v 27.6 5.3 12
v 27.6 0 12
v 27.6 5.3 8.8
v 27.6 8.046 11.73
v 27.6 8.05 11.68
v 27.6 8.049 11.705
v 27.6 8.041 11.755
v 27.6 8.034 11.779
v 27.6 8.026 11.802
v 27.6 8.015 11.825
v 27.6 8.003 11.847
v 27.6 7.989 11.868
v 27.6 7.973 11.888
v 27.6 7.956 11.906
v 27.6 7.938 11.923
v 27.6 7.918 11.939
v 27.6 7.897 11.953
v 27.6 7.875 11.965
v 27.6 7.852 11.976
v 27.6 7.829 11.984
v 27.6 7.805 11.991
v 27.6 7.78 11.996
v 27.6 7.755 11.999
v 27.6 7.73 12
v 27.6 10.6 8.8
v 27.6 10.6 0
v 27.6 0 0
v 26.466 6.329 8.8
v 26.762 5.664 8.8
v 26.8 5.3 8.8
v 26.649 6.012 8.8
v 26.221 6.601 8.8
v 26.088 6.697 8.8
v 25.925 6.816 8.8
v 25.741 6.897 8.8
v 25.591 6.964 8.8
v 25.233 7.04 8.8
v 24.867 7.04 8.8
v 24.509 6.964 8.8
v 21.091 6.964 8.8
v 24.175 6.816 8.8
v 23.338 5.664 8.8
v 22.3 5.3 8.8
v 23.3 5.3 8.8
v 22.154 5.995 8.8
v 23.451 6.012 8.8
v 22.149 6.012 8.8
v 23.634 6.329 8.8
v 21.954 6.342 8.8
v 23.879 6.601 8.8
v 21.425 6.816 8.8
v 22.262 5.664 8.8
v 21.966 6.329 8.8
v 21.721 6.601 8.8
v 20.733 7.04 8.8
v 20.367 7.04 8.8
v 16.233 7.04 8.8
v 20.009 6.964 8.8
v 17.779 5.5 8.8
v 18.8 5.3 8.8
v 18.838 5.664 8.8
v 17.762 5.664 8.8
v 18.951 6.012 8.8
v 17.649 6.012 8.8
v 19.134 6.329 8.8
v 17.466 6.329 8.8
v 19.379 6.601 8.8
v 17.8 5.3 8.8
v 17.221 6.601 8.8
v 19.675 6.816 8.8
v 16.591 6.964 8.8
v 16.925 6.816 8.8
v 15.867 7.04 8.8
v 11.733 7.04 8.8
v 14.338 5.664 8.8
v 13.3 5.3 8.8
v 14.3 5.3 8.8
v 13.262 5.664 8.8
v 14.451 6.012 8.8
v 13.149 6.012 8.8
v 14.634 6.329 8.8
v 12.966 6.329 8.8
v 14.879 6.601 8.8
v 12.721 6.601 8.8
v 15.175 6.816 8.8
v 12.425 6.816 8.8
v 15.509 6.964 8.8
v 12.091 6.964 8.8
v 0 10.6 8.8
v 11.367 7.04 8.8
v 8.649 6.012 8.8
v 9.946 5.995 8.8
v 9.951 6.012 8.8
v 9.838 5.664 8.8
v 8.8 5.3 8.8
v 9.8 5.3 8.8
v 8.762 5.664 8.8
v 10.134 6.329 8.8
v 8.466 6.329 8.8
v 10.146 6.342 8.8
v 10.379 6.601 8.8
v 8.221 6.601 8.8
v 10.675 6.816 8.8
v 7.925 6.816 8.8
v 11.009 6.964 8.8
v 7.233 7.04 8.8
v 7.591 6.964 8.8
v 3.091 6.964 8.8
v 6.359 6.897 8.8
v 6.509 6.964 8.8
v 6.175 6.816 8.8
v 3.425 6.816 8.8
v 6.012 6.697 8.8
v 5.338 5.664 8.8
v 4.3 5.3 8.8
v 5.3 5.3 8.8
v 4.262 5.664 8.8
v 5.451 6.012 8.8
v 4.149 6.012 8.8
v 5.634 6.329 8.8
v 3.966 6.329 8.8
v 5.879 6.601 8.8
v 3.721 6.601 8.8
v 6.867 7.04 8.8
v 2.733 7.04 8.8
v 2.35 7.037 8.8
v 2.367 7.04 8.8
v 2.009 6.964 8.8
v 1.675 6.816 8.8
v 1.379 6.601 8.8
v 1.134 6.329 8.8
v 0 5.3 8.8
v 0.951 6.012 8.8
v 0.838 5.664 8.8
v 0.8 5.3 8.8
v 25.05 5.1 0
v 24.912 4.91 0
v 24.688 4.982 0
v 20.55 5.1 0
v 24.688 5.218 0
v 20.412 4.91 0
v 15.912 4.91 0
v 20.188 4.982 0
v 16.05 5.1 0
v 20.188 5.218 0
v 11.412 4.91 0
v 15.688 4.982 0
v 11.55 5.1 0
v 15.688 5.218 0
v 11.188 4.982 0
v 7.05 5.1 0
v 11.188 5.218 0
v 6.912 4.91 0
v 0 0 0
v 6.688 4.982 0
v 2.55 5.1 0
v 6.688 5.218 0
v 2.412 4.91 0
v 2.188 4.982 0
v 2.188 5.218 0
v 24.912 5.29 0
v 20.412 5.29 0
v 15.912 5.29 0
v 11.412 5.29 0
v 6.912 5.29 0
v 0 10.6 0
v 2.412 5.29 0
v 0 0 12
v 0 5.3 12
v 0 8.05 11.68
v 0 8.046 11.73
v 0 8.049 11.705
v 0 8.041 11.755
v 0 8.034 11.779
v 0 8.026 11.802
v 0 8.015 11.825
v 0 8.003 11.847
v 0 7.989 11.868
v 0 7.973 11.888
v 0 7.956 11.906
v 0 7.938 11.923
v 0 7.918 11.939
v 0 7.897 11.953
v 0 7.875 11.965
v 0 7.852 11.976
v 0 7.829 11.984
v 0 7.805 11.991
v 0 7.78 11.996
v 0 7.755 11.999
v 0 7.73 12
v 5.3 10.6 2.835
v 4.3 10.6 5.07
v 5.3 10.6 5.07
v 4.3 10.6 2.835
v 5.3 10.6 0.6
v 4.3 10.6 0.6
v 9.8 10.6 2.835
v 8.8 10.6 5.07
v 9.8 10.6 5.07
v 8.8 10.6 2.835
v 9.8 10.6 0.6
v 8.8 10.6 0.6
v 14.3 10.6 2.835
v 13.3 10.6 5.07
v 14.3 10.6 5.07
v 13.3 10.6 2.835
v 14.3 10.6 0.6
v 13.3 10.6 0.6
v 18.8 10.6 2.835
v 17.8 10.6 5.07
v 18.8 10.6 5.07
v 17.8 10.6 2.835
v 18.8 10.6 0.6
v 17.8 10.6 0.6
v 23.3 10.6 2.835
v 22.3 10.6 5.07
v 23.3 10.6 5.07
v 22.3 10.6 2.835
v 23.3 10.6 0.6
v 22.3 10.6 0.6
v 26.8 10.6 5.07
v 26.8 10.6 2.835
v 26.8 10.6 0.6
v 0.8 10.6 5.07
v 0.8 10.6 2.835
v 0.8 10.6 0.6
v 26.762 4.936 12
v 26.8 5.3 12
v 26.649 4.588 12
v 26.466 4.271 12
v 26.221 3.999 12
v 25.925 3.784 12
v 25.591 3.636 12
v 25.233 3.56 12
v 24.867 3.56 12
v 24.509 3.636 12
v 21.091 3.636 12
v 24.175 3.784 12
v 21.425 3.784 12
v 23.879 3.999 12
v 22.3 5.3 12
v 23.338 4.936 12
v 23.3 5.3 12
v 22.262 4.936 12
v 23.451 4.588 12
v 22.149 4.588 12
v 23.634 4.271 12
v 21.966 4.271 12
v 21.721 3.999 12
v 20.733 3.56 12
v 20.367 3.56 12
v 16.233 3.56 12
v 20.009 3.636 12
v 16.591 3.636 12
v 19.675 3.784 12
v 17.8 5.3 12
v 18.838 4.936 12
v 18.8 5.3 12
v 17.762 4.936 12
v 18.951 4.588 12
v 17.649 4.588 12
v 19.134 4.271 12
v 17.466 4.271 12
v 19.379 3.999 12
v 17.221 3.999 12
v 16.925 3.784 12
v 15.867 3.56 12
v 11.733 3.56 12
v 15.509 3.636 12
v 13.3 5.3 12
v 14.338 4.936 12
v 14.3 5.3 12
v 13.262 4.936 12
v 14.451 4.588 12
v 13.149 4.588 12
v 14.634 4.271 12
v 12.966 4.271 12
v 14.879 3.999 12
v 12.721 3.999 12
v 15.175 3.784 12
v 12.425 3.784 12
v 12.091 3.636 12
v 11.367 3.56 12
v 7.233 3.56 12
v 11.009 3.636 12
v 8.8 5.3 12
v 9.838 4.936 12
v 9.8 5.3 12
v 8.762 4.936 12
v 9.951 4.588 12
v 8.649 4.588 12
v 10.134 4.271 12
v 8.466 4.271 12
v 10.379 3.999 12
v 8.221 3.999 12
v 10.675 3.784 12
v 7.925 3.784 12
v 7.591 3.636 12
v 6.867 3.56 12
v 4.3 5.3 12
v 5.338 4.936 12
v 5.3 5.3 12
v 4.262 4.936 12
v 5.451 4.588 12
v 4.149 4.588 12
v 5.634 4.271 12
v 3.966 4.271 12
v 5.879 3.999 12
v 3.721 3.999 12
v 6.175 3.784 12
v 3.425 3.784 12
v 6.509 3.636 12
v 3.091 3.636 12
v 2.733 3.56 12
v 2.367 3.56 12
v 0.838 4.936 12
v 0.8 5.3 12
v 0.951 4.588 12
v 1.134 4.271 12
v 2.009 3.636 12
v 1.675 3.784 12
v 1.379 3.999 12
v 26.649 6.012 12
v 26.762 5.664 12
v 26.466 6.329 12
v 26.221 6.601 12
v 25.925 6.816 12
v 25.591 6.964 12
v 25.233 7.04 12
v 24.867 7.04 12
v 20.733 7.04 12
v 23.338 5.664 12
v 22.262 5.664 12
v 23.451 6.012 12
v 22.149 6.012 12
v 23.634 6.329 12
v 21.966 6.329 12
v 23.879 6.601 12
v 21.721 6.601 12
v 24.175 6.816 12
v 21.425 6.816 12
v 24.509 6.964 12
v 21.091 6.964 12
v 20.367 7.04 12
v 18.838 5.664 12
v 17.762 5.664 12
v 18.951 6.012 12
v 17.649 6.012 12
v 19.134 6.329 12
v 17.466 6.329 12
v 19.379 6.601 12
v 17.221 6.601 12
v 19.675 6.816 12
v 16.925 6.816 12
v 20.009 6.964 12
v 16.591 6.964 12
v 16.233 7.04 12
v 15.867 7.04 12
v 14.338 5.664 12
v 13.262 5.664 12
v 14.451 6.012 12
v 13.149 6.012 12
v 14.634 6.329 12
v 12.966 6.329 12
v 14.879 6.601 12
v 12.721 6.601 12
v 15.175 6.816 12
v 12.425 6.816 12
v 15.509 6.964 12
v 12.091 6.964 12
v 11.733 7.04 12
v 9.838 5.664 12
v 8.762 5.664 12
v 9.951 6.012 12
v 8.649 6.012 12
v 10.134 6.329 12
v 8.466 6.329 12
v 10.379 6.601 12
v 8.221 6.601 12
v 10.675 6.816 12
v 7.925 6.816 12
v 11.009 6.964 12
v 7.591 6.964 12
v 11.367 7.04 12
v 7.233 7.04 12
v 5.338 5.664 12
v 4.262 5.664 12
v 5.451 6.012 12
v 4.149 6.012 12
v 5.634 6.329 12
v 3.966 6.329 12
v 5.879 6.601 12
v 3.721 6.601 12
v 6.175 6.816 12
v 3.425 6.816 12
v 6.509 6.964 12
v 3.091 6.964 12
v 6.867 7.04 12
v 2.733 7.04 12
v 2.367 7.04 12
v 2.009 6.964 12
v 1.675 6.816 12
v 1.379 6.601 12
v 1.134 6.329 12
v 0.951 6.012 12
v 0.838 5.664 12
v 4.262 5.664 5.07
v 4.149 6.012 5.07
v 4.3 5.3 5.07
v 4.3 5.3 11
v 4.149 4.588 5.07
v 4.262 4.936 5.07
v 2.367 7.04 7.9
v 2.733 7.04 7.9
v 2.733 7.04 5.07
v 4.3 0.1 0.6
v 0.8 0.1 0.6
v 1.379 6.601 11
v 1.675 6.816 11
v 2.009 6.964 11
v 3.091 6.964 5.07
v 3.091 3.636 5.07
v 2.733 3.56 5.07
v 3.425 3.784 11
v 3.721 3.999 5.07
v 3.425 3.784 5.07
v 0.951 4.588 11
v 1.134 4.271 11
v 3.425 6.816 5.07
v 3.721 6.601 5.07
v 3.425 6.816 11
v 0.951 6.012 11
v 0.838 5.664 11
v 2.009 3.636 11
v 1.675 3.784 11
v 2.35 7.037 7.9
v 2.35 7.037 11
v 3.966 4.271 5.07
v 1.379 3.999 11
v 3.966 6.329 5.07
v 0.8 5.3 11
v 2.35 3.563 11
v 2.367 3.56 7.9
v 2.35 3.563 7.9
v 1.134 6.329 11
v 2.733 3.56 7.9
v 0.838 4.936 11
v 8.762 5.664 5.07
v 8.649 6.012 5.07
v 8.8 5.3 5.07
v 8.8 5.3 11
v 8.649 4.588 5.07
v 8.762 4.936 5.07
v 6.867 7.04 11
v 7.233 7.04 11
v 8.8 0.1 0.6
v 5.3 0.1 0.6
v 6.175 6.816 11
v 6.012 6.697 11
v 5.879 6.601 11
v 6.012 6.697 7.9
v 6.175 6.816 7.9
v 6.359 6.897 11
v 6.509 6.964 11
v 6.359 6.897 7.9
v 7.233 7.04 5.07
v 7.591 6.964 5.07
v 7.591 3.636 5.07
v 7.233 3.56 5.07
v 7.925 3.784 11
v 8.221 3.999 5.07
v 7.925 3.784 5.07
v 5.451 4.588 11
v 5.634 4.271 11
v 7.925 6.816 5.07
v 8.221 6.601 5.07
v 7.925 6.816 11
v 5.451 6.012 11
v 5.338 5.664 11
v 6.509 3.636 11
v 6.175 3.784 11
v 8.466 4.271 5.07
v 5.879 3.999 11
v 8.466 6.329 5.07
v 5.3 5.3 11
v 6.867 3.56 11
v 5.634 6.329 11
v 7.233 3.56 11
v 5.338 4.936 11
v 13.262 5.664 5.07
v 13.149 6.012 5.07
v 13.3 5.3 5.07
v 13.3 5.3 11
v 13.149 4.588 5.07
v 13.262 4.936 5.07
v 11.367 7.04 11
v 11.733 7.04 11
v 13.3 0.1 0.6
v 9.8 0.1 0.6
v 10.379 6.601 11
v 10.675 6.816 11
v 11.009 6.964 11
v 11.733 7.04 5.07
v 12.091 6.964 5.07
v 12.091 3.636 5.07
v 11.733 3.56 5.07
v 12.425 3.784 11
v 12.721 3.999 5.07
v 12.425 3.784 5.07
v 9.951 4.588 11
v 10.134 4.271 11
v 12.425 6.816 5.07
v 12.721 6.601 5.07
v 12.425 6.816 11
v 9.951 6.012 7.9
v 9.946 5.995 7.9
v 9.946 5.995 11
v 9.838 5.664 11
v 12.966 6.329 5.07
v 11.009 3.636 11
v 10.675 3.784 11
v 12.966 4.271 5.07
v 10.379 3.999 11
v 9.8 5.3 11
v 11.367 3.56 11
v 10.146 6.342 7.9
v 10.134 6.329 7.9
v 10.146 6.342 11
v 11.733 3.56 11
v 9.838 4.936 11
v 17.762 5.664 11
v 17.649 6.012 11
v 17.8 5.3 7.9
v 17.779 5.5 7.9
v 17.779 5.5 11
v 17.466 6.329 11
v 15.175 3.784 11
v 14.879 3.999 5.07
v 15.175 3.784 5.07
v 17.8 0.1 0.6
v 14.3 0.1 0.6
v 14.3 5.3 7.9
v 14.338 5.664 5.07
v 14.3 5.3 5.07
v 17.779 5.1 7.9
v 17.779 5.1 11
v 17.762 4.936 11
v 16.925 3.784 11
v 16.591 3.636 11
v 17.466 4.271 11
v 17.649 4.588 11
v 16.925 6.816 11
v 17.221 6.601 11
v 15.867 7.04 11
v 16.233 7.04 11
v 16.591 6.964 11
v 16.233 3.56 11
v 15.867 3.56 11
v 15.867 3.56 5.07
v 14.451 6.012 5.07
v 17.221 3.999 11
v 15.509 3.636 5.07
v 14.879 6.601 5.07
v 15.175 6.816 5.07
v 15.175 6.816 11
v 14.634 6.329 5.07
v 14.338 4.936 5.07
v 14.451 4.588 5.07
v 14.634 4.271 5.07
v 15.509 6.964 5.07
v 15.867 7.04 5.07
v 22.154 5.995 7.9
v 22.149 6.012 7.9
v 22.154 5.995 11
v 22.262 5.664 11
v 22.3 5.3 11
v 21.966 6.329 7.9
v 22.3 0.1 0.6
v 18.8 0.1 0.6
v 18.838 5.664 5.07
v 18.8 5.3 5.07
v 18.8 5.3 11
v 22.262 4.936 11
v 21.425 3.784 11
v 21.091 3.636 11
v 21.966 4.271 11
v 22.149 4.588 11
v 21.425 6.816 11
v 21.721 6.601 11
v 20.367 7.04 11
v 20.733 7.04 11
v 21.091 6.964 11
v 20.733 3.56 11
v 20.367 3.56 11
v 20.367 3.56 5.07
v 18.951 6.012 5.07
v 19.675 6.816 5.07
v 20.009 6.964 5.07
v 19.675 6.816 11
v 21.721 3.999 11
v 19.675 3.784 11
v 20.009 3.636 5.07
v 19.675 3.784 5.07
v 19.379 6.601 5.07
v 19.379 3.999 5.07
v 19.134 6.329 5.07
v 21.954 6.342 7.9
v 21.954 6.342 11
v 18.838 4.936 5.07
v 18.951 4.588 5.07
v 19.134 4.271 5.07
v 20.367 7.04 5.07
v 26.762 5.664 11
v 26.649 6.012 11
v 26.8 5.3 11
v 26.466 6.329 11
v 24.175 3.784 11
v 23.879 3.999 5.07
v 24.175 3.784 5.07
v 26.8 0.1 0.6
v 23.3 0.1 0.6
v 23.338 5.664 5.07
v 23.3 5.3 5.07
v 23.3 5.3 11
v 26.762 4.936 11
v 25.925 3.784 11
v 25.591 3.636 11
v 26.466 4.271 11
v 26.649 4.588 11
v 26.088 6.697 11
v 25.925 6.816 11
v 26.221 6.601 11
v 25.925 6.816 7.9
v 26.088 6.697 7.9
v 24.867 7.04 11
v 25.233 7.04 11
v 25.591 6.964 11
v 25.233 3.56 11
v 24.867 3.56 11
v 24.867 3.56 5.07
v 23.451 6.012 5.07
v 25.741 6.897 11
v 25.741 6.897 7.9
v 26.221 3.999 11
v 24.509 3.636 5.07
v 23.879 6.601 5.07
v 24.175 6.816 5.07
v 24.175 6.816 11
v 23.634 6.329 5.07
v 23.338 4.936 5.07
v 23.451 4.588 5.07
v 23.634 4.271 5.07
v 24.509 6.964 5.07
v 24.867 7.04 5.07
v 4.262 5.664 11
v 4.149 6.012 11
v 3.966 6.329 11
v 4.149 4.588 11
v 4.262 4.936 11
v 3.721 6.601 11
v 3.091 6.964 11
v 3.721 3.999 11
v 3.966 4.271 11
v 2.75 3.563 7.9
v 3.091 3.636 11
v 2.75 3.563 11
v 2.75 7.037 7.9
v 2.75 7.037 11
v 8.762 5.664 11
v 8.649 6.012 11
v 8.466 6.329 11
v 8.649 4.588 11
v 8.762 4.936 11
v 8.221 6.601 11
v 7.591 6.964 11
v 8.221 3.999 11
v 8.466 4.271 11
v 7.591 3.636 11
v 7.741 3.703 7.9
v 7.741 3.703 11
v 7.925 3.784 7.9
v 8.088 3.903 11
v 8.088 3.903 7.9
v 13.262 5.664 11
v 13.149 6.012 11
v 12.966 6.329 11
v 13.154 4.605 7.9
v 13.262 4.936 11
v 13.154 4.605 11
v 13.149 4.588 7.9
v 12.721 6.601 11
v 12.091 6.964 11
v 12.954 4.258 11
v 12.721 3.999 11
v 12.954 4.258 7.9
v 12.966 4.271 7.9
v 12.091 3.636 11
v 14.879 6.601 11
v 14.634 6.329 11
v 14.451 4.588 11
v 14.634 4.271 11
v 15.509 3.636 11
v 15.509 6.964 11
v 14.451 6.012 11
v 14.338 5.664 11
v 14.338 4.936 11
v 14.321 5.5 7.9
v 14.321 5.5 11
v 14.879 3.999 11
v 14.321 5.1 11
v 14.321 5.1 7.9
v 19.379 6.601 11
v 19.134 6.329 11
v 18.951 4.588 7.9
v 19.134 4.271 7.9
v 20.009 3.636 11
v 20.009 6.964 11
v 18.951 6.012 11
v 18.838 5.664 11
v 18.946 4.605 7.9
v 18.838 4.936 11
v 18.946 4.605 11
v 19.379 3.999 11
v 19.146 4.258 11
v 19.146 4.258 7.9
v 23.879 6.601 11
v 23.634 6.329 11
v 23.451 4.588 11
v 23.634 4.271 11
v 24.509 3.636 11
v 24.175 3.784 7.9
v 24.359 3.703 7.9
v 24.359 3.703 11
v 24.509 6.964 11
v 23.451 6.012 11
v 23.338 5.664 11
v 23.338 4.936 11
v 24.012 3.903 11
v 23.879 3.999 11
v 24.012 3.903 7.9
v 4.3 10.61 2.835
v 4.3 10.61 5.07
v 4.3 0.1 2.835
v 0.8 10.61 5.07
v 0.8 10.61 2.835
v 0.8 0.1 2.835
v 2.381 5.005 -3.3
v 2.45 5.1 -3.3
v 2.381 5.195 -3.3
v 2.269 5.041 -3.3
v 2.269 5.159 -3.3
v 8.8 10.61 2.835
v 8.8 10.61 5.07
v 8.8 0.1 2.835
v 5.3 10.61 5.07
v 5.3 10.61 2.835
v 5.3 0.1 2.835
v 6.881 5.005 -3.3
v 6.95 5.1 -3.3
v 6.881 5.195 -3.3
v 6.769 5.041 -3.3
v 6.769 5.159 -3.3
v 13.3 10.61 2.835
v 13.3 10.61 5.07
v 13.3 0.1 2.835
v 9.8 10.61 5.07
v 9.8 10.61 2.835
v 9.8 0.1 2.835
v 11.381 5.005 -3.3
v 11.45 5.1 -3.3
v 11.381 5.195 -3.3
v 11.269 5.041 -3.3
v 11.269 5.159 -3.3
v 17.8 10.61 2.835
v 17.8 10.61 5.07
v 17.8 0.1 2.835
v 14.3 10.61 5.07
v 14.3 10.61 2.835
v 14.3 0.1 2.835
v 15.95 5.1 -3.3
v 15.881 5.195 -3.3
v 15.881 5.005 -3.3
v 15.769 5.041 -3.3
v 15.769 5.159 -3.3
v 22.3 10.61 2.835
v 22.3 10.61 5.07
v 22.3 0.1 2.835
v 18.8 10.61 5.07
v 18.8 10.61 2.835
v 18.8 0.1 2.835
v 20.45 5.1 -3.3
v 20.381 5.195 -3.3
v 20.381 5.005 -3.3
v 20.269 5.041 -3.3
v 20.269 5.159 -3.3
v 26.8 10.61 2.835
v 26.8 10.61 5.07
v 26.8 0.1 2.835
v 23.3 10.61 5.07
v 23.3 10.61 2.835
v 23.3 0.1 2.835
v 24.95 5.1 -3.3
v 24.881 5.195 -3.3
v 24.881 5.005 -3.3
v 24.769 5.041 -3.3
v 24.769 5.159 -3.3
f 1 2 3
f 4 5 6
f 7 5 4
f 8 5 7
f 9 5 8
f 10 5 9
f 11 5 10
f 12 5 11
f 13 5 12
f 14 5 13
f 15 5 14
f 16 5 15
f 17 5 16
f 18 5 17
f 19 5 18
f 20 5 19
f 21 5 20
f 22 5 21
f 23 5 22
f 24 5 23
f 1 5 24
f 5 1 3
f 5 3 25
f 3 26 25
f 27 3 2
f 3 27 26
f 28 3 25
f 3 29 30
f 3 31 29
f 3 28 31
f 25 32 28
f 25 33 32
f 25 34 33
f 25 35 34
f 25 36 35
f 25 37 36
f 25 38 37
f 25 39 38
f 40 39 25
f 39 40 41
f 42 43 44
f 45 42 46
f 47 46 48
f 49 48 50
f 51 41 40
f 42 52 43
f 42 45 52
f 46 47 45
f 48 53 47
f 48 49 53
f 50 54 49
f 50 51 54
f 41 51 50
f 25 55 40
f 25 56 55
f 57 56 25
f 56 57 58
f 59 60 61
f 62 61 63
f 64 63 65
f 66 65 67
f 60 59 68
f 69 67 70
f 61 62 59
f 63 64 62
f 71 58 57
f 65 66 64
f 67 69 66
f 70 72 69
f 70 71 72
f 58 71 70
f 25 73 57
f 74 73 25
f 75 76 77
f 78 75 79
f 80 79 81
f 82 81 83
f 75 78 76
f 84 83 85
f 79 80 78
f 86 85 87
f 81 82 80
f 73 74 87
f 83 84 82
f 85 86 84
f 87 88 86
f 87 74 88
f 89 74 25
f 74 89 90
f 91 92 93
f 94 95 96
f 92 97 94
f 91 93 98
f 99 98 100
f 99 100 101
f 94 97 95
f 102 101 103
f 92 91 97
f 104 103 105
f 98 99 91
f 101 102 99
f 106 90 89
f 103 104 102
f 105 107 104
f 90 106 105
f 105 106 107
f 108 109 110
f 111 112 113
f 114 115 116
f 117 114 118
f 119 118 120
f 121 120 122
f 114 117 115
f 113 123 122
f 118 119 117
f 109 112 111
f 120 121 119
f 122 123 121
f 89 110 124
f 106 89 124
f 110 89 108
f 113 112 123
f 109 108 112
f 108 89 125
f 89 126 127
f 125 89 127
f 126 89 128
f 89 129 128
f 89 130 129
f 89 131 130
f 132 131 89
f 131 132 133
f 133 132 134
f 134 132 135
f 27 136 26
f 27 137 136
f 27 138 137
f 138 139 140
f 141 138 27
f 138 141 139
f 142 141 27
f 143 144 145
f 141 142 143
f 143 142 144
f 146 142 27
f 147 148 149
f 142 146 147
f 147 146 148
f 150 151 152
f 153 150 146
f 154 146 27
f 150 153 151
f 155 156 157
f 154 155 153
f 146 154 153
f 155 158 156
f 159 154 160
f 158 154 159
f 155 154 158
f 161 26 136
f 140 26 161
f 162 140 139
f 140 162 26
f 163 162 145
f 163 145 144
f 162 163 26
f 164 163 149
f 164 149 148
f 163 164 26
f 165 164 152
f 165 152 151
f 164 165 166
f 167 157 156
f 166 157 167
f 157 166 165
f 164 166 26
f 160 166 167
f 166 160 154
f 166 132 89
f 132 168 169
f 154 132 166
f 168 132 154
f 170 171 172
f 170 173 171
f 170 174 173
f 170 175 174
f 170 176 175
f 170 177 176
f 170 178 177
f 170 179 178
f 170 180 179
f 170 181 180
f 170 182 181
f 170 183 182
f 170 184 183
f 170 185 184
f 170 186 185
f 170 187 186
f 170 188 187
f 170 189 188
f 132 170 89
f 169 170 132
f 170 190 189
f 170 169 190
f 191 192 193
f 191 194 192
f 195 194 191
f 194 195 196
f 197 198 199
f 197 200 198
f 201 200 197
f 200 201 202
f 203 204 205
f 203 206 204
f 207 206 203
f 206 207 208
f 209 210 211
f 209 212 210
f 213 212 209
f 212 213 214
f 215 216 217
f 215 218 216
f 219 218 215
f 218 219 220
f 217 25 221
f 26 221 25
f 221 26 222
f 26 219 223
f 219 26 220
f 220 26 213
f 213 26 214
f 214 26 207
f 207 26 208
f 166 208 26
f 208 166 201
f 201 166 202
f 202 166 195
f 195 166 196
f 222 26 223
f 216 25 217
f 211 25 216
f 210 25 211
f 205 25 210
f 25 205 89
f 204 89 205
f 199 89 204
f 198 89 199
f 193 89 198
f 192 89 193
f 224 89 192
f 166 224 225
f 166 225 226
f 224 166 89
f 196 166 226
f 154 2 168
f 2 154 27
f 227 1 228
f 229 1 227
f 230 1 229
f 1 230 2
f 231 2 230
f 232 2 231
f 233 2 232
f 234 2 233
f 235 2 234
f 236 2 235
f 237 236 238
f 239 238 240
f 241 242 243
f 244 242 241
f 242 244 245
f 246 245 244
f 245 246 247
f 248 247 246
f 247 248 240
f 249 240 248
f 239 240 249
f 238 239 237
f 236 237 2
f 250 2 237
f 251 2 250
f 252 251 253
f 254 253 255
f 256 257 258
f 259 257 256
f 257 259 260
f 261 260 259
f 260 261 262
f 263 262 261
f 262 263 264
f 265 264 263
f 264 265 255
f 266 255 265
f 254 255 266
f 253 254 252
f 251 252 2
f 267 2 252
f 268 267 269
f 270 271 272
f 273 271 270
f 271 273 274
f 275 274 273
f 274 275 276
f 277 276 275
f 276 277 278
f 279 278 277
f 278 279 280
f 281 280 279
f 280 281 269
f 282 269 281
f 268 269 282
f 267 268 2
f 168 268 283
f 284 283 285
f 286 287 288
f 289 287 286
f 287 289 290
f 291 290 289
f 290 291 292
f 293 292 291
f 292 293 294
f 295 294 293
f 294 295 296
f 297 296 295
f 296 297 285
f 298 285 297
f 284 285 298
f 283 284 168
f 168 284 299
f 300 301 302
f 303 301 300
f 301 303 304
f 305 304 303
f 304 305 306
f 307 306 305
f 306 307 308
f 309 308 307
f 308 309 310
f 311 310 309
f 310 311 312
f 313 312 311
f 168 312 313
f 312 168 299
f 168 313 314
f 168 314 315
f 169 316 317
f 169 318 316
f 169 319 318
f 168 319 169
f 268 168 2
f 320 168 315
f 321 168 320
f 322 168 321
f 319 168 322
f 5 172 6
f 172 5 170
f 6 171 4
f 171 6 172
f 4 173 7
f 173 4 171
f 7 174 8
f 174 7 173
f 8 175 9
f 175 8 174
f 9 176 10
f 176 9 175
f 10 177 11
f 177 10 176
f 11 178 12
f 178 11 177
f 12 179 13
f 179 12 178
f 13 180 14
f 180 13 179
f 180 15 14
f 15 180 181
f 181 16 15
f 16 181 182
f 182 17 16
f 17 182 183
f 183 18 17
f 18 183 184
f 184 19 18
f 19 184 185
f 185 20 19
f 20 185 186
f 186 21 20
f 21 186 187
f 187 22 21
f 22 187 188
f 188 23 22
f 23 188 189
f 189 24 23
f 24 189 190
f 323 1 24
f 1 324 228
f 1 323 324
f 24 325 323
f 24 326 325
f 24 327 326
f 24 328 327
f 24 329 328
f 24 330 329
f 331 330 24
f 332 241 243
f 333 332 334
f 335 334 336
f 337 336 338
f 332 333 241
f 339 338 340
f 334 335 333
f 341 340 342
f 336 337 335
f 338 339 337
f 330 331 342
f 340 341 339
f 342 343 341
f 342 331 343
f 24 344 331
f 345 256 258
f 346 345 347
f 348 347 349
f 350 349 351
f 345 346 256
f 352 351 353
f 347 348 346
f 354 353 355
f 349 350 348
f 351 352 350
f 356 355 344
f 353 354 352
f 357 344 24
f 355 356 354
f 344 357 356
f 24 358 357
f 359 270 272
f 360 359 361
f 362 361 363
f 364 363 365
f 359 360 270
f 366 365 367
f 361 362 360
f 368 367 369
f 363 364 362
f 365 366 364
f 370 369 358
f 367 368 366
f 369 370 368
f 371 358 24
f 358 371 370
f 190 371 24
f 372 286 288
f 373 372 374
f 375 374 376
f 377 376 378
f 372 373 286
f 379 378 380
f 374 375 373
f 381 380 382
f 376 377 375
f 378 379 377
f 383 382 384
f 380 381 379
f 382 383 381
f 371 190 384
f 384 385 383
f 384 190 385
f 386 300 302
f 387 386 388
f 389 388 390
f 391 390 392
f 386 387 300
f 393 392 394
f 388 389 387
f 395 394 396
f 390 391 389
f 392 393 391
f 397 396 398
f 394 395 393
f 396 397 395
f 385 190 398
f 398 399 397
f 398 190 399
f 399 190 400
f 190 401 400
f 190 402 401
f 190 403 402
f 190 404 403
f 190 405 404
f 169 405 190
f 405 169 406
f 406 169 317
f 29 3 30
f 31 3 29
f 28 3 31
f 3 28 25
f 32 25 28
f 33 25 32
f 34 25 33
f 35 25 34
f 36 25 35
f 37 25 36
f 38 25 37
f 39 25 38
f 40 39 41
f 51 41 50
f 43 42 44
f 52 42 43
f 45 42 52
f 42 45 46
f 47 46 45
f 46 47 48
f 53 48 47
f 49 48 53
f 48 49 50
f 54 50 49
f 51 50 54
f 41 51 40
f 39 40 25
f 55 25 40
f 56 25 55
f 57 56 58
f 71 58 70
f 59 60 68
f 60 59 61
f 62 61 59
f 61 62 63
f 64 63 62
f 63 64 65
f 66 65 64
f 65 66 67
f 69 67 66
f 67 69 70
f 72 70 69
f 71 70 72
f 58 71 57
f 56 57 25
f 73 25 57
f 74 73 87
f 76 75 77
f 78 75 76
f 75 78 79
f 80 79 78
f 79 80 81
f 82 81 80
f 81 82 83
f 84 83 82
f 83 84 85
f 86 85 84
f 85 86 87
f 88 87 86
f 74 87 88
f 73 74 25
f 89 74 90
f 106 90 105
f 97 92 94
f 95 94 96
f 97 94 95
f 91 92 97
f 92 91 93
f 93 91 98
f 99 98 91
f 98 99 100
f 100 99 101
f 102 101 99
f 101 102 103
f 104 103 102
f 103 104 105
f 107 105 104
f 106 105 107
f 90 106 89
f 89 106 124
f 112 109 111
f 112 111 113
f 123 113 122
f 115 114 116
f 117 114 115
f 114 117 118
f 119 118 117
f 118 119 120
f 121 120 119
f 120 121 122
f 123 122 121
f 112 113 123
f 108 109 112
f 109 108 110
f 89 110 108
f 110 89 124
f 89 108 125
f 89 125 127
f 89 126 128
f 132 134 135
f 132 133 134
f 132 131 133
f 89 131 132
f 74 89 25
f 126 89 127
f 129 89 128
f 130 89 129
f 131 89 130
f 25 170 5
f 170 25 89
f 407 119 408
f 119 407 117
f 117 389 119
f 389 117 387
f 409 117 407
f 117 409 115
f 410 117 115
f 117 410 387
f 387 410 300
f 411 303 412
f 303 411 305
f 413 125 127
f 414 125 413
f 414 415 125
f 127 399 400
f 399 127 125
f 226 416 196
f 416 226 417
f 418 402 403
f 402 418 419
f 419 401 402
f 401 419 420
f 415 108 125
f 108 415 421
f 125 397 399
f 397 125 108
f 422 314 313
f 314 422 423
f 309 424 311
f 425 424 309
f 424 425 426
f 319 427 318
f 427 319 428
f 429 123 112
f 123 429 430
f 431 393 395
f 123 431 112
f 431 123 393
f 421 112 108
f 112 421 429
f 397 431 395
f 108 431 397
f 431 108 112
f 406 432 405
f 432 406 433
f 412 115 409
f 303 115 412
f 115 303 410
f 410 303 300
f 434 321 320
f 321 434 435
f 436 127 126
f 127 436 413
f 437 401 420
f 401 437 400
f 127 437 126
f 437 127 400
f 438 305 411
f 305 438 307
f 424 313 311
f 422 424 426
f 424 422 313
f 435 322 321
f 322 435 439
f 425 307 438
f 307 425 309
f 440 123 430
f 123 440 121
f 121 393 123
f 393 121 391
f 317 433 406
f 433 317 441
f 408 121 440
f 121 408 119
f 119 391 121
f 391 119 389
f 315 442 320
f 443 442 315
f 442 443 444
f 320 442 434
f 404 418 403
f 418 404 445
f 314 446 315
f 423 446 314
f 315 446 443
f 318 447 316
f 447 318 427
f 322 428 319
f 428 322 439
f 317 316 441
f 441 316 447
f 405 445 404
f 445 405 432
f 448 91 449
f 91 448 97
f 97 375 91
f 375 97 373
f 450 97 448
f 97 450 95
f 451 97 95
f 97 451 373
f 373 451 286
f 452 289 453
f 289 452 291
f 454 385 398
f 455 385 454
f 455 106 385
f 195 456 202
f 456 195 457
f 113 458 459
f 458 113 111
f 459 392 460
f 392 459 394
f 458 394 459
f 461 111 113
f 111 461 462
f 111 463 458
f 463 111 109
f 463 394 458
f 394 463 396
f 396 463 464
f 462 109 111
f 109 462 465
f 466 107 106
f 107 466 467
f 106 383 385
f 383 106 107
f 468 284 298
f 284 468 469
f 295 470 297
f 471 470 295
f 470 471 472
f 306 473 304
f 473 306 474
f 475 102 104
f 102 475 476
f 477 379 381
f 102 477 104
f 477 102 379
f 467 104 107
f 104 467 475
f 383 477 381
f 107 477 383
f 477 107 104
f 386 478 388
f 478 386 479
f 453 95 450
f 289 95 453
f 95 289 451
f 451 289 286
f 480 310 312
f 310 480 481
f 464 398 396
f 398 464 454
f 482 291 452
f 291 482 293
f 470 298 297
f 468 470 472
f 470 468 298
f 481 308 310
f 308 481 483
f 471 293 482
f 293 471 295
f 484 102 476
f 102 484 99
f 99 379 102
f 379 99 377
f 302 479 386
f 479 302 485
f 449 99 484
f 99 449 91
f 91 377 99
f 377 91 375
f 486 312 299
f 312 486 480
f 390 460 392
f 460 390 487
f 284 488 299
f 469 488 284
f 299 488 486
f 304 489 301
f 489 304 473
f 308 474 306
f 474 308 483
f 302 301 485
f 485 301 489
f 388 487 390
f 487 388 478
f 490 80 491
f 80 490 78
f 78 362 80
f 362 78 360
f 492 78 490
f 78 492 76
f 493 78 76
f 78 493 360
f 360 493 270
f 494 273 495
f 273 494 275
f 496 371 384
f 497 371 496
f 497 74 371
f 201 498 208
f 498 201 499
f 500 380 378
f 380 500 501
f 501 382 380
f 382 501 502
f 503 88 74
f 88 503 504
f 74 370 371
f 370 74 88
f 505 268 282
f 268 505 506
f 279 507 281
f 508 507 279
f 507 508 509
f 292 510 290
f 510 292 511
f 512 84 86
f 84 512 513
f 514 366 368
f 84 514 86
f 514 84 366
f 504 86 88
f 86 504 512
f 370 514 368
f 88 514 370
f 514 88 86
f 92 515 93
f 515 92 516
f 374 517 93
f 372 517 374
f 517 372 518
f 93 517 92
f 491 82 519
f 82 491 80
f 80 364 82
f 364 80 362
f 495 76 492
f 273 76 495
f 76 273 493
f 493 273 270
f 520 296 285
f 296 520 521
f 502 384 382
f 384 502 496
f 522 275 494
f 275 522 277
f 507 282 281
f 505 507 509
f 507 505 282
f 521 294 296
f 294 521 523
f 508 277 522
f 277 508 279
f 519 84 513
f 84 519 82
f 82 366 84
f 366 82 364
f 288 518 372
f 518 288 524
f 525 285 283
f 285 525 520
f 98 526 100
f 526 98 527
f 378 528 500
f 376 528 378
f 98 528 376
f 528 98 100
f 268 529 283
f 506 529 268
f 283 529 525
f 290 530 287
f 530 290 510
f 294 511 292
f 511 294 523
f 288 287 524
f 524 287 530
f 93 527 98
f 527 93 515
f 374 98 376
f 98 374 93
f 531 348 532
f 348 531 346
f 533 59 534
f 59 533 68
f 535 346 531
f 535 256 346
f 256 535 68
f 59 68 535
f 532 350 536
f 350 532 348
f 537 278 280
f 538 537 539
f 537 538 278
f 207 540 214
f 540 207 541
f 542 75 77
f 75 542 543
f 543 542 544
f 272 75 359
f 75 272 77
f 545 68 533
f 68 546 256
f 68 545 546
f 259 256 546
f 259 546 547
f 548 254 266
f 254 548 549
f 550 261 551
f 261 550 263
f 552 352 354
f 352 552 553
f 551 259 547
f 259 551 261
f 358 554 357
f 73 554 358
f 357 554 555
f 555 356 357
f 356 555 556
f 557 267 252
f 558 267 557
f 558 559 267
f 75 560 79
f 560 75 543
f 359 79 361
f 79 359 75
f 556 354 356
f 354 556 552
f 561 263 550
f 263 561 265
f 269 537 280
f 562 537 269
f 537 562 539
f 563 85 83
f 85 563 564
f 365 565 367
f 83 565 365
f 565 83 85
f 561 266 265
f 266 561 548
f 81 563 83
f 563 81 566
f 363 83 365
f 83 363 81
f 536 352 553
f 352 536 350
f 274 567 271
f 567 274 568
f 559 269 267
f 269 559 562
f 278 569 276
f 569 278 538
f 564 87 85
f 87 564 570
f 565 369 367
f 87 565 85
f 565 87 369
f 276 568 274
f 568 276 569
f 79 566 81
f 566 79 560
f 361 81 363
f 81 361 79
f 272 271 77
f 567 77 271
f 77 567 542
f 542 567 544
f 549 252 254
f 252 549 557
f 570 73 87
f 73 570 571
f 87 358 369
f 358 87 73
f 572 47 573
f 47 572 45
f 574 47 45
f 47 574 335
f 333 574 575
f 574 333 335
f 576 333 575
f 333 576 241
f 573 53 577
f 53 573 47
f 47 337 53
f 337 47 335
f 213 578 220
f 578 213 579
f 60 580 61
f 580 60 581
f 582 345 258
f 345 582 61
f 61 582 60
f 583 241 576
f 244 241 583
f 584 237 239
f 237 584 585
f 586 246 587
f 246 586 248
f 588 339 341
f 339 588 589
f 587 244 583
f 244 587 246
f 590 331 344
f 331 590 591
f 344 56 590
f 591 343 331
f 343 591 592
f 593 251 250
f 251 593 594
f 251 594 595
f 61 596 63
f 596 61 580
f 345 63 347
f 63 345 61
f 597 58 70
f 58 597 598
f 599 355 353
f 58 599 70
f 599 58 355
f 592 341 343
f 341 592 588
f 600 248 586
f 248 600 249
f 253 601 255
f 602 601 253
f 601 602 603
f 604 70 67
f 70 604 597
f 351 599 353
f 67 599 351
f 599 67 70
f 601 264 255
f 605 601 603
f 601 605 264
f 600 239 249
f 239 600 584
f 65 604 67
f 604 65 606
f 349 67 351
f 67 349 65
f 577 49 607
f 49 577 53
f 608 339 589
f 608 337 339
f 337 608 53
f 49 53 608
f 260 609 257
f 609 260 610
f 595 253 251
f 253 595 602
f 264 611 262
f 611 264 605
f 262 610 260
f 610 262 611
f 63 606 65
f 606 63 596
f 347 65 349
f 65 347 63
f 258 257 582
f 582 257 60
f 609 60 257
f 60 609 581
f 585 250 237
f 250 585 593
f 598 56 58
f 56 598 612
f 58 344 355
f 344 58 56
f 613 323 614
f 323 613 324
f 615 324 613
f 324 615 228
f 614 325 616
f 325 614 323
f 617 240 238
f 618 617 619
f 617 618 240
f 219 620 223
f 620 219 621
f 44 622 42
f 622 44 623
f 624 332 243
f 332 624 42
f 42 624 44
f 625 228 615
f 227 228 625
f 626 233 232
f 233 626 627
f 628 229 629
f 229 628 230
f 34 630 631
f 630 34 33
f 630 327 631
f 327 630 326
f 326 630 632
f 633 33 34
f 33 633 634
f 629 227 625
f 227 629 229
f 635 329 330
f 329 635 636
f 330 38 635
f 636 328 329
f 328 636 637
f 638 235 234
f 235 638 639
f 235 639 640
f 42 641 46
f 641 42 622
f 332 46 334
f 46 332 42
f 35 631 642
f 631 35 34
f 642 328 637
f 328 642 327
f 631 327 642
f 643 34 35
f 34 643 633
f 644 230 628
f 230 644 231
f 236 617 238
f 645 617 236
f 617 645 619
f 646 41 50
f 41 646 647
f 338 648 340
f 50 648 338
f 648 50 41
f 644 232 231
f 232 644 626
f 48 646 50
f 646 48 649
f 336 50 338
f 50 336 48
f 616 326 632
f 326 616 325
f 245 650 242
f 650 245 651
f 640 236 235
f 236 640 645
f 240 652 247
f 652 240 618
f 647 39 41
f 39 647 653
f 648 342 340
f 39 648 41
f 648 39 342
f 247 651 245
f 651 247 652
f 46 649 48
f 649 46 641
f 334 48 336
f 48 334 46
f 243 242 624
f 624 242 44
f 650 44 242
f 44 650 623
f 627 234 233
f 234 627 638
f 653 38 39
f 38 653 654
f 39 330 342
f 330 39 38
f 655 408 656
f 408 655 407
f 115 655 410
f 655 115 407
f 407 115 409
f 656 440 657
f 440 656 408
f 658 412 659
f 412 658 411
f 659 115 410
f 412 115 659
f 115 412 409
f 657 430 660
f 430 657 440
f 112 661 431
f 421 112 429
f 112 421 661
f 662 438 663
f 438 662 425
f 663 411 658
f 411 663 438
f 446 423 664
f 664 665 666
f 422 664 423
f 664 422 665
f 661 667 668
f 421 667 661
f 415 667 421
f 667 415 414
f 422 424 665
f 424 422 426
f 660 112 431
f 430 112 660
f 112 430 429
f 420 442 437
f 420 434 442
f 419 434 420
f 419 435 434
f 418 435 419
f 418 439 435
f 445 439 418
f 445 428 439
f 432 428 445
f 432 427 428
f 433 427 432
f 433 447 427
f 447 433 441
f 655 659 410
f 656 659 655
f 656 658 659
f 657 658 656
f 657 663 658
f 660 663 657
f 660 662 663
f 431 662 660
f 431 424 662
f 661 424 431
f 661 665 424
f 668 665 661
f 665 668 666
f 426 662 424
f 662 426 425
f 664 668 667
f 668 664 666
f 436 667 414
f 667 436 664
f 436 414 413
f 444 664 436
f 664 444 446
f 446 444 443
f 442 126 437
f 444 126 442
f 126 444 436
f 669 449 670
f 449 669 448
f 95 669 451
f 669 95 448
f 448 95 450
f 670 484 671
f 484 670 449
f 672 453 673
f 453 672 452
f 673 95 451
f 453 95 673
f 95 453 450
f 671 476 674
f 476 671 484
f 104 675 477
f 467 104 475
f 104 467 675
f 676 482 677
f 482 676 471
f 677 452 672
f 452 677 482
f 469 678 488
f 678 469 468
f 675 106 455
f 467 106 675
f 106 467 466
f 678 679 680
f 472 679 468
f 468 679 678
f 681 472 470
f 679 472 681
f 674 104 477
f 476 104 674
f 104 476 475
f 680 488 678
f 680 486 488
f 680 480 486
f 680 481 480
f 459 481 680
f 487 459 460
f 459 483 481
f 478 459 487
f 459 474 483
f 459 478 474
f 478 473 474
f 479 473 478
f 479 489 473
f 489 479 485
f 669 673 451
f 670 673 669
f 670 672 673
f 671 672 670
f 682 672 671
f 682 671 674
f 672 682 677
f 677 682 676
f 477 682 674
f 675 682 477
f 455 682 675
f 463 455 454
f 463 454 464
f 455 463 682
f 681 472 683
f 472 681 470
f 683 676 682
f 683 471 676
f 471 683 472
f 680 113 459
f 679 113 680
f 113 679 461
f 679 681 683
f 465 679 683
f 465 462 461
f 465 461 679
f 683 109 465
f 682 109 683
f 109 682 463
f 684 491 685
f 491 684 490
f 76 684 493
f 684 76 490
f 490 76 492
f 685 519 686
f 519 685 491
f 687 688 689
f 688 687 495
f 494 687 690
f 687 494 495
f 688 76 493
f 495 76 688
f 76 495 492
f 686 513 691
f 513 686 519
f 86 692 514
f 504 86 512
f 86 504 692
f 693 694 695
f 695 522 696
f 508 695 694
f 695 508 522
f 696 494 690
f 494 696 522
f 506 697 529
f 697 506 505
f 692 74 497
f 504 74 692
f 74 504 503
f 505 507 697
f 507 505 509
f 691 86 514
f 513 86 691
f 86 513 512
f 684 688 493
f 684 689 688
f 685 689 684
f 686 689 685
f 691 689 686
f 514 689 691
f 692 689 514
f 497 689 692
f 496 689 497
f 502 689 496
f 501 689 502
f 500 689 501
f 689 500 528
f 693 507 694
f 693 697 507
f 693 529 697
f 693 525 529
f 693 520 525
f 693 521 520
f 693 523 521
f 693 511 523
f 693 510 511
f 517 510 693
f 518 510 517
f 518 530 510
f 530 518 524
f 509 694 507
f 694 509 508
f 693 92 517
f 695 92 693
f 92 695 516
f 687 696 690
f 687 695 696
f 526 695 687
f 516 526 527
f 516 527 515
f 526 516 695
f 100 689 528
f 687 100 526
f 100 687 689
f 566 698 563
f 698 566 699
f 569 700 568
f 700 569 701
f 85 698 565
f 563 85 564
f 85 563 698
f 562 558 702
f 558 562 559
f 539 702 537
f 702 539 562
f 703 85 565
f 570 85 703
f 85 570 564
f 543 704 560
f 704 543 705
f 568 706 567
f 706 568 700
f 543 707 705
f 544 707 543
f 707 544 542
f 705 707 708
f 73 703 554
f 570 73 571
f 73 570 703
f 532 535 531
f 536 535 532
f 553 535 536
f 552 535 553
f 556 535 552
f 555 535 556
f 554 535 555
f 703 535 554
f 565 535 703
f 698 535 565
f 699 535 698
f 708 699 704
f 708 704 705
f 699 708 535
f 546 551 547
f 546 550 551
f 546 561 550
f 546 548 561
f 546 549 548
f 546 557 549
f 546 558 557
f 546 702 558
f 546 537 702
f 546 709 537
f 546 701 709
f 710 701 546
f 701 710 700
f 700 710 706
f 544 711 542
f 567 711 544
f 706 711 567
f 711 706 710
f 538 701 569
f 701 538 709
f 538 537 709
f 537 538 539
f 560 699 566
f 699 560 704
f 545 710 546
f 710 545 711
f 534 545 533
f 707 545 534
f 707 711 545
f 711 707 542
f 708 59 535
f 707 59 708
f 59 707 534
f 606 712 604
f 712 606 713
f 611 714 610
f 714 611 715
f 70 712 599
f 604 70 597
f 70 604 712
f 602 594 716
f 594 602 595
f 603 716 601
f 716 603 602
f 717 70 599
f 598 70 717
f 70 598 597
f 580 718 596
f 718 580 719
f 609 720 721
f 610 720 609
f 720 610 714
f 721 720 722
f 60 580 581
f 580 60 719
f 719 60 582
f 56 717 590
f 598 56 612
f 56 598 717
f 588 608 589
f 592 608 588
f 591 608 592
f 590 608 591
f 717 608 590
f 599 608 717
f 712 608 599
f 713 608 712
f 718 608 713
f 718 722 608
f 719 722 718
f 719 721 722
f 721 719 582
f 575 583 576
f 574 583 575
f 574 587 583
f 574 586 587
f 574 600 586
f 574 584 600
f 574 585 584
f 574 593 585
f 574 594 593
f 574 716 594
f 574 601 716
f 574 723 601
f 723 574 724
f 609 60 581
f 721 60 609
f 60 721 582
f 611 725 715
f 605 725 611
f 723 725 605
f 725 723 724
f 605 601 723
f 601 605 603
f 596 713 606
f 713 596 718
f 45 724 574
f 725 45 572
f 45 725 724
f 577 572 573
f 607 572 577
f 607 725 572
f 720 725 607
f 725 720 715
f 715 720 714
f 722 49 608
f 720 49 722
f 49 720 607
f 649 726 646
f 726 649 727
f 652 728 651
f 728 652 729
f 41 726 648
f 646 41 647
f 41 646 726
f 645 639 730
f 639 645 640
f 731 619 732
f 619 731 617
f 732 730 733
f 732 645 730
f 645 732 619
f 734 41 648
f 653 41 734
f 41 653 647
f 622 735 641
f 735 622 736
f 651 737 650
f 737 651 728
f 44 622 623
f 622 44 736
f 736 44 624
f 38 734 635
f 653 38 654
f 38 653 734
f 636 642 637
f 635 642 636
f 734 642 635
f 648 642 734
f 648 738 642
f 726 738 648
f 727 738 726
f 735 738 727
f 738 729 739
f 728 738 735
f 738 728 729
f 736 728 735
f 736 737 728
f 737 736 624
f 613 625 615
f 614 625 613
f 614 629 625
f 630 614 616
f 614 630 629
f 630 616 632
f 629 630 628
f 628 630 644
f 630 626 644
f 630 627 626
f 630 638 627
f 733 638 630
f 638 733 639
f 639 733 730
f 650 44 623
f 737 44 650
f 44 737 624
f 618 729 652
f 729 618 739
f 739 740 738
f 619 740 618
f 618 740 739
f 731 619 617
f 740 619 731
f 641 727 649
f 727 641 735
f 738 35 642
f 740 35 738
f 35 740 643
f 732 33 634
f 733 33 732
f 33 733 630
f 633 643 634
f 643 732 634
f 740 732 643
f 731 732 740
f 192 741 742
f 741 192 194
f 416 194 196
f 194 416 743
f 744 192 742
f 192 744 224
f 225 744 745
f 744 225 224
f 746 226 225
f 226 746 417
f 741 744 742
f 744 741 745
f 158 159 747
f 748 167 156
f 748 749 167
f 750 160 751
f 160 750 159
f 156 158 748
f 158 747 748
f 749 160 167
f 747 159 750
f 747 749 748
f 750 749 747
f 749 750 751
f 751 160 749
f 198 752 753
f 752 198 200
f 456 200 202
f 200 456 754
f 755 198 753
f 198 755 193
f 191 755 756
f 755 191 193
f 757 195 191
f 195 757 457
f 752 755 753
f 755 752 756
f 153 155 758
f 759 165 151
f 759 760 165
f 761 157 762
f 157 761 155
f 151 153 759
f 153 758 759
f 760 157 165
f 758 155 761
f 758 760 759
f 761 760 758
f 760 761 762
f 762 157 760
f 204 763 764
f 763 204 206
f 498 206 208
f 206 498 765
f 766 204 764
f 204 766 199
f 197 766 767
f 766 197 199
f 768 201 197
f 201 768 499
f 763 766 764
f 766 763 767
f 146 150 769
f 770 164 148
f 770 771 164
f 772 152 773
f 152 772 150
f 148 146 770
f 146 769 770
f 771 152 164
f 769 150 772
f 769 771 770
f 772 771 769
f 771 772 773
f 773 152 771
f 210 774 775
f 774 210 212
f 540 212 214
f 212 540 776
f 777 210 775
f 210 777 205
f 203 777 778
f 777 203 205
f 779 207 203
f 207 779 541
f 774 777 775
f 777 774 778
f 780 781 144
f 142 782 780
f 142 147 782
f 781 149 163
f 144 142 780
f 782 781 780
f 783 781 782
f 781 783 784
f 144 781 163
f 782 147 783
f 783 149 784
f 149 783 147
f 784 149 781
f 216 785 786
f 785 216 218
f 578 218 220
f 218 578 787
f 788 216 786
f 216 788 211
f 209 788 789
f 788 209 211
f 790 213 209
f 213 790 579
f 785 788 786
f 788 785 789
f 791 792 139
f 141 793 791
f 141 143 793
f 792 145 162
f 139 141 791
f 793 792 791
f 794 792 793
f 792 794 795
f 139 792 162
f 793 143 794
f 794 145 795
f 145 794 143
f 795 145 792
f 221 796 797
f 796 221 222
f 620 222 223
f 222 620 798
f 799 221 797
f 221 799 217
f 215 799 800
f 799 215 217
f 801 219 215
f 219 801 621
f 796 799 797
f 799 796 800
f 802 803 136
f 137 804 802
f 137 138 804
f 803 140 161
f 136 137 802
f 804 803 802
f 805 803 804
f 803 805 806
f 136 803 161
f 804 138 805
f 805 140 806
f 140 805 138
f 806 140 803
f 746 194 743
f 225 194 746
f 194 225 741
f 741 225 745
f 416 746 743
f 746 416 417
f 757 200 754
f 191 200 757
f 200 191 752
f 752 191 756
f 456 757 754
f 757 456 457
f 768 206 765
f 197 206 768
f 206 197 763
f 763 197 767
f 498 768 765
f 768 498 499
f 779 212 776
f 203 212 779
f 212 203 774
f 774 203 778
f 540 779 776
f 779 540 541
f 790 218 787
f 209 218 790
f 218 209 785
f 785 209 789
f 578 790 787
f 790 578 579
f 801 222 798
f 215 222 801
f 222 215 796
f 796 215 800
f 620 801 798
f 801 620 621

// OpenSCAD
/**
 * Module: Screw Terminal block
 *
 * Author: Karim Aziiev <karim.aziiev@gmail.com>
 * License: GPL-3.0-or-later
 */

include <../colors.scad>
include <presets.scad>

use <../lib/functions.scad>
use <../lib/plist.scad>
use <../lib/shapes3d.scad>
use <../lib/slots.scad>
use <../lib/trapezoids.scad>

function screw_terminal_width(base_w,
                              pitch,
                              contacts_n,
                              contact_w,
                              wall_thickness) =
  let (needed_contacts_span = (contacts_n <= 1)
                              ? contact_w
                              : (contact_w + (contacts_n - 1) * pitch),

       side_margin = max(0.8, wall_thickness))
  is_undef(base_w)
  ? (needed_contacts_span + 2 * side_margin)
  : base_w;

function screw_terminal_width_from_plist(plist=screw_terminal_plist) =
  assert(plist_is(plist) && len(plist) > 0, "Supply a hardware specification")
  let (base_w = plist_get("base_w", plist),
       pitch = plist_get("pitch", plist, 4.5),
       contacts_n = plist_get("contacts_n", plist, 2),
       contact_w = plist_get("contact_w", plist, 3.5),
       wall_thickness = plist_get("wall_thickness", plist, 0.6))
  screw_terminal_width(base_w=base_w,
                       pitch=pitch,
                       contact_w=contact_w,
                       wall_thickness=wall_thickness,
                       contacts_n=contacts_n);

module screw_terminal(base_w = undef,            // overall base width (optional)
                      base_h = 6.8,              // base height (Z)
                      thickness = 7.6,           // body depth (Y)
                      top_l = 5.50,              // top trapezoid top side length
                      top_h = 3.2,               // top trapezoid height
                      contacts_n = 2,            // number of contact boxes
                      contact_w = 3.5,           // contact box width (X)
                      contact_h = 4.47,          // contact box height (Z)
                      pitch = 4.5,              // center-to-center spacing (X)
                      colr = medium_blue_2,
                      pin_thickness = 0.4,       // lower thin pin cross/width
                      pin_h = 3.9,               // lower thin pin height
                      wall_thickness = 0.6,  // wall offset from base top
                      center=true,
                      isosceles_trapezoid=false,
                      slot_mode=false,
                      slot_thickness,
                      slot_d) {

  effective_base_w = screw_terminal_width(base_w,
                                          pitch=pitch,
                                          contacts_n=contacts_n,
                                          contact_w=contact_w,
                                          wall_thickness=wall_thickness);

  x_start = -((contacts_n - 1) * pitch) / 2;

  slot_d = with_default(slot_d, contact_w);

  translate([center ? 0 : effective_base_w / 2, center ? 0 : thickness / 2, 0]) {
    if (slot_mode) {
      for (i = [0 : contacts_n - 1]) {
        cx = x_start + i * pitch;

        translate([cx - pin_thickness / 2, - pin_thickness / 2, 0]) {
          counterbore(h=slot_thickness, d=slot_d);
        }
      }
    } else {
      difference() {
        union() {
          color(colr, alpha=1) {
            difference() {
              union() {
                cuboid(size = [effective_base_w, thickness, base_h]);

                if (!isosceles_trapezoid) {
                  translate([0, -thickness / 4, 0]) {
                    cuboid(size = [effective_base_w, thickness / 2, base_h + top_h]);
                  }
                }

                translate([-effective_base_w / 2, 0, top_h / 2 + base_h]) {
                  rotate([90, 0, 90]) {
                    linear_extrude(height = effective_base_w, center = false) {
                      trapezoid_rounded_top(t = top_l,
                                            b = thickness,
                                            h = top_h,
                                            center = true);
                    }
                  }
                }
              }
              for (i = [0 : contacts_n - 1]) {
                cx = x_start + i * pitch;
                translate([cx, 0, wall_thickness]) {
                  cylinder(h = base_h + top_h, d = contact_w, $fn = 30);
                }
              }
            }
          }

          color(metallic_silver_6, alpha = 1) {
            for (i = [0 : contacts_n - 1]) {
              cx = x_start + i * pitch;

              translate([cx, 0.01, wall_thickness]) {
                cuboid([contact_w, thickness, contact_h]);
              }

              translate([cx, 0, wall_thickness]) {
                difference() {
                  cylinder(h = base_h + top_h / 2, d = contact_w, $fn = 30);
                  rotate([0, 0, i * 30]) {
                    translate([0, 0, base_h + top_h / 2 - top_h + 0.1]) {
                      cuboid([0.4, contact_w, top_h]);
                    }
                  }
                }
              }

              translate([cx - pin_thickness / 2,
                         - pin_thickness / 2,
                         -pin_h]) {
                cylinder(r1=pin_thickness * 0.25,
                         r2=pin_thickness / 2,
                         h=pin_h);
              }
            }
          }
        }

        for (i = [0 : contacts_n - 1]) {
          cx = x_start + i * pitch;

          translate([cx, 0.1, wall_thickness]) {
            cuboid([contact_w, thickness, contact_h / 2]);
          }
        }
      }
    }
  }
}

module screw_terminal_from_plist(plist=screw_terminal_plist,
                                 center=false,
                                 slot_thickness=2,
                                 slot_mode=false) {
  assert(plist_is(plist) && len(plist) > 0, "Supply a hardware specification");
  thickness = plist_get("thickness", plist);
  isosceles_trapezoid = plist_get("isosceles_trapezoid", plist, false);
  base_h = plist_get("base_h", plist);
  top_l = plist_get("top_l", plist);
  top_h = plist_get("top_h", plist);
  contacts_n = plist_get("contacts_n", plist);
  contact_w = plist_get("contact_w", plist);
  contact_h = plist_get("contact_h", plist);
  pitch = plist_get("pitch", plist);
  colr = plist_get("colr", plist);
  pin_thickness = plist_get("pin_thickness", plist, 0.4);
  pin_h = plist_get("pin_h", plist, 0);
  wall_thickness = plist_get("wall_thickness", plist, 0.6);
  base_w = plist_get("base_w",
                     plist,
                     screw_terminal_width_from_plist(plist));
  screw_terminal(thickness=thickness,
                 isosceles_trapezoid=isosceles_trapezoid,
                 base_h=base_h,
                 top_l=top_l,
                 base_w=base_w,
                 top_h=top_h,
                 contacts_n=contacts_n,
                 contact_w=contact_w,
                 contact_h=contact_h,
                 pitch=pitch,
                 colr=colr,
                 pin_thickness=pin_thickness,
                 pin_h=pin_h,
                 wall_thickness=wall_thickness,
                 center=center,
                 slot_mode=slot_mode,
                 slot_thickness=slot_thickness);
}

screw_terminal_from_plist(["placeholder", "screw_terminal",
                           "base_w", undef,
                           "base_h", 8.8,
                           "thickness", 10.6,
                           "top_l", 5.50,
                           "top_h", 3.2,
                           "contacts_n", 6,
                           "contact_w", 3.5,
                           "contact_h", 4.47,
                           "pitch", 4.5,
                           "colr", medium_blue_2,
                           "pin_thickness", 0.4,
                           "pin_h", 3.3,
                           "wall_thickness", 0.6,
                           "isosceles_trapezoid", false],
                          center=false,
                          slot_thickness=1,
                          slot_mode=false);
